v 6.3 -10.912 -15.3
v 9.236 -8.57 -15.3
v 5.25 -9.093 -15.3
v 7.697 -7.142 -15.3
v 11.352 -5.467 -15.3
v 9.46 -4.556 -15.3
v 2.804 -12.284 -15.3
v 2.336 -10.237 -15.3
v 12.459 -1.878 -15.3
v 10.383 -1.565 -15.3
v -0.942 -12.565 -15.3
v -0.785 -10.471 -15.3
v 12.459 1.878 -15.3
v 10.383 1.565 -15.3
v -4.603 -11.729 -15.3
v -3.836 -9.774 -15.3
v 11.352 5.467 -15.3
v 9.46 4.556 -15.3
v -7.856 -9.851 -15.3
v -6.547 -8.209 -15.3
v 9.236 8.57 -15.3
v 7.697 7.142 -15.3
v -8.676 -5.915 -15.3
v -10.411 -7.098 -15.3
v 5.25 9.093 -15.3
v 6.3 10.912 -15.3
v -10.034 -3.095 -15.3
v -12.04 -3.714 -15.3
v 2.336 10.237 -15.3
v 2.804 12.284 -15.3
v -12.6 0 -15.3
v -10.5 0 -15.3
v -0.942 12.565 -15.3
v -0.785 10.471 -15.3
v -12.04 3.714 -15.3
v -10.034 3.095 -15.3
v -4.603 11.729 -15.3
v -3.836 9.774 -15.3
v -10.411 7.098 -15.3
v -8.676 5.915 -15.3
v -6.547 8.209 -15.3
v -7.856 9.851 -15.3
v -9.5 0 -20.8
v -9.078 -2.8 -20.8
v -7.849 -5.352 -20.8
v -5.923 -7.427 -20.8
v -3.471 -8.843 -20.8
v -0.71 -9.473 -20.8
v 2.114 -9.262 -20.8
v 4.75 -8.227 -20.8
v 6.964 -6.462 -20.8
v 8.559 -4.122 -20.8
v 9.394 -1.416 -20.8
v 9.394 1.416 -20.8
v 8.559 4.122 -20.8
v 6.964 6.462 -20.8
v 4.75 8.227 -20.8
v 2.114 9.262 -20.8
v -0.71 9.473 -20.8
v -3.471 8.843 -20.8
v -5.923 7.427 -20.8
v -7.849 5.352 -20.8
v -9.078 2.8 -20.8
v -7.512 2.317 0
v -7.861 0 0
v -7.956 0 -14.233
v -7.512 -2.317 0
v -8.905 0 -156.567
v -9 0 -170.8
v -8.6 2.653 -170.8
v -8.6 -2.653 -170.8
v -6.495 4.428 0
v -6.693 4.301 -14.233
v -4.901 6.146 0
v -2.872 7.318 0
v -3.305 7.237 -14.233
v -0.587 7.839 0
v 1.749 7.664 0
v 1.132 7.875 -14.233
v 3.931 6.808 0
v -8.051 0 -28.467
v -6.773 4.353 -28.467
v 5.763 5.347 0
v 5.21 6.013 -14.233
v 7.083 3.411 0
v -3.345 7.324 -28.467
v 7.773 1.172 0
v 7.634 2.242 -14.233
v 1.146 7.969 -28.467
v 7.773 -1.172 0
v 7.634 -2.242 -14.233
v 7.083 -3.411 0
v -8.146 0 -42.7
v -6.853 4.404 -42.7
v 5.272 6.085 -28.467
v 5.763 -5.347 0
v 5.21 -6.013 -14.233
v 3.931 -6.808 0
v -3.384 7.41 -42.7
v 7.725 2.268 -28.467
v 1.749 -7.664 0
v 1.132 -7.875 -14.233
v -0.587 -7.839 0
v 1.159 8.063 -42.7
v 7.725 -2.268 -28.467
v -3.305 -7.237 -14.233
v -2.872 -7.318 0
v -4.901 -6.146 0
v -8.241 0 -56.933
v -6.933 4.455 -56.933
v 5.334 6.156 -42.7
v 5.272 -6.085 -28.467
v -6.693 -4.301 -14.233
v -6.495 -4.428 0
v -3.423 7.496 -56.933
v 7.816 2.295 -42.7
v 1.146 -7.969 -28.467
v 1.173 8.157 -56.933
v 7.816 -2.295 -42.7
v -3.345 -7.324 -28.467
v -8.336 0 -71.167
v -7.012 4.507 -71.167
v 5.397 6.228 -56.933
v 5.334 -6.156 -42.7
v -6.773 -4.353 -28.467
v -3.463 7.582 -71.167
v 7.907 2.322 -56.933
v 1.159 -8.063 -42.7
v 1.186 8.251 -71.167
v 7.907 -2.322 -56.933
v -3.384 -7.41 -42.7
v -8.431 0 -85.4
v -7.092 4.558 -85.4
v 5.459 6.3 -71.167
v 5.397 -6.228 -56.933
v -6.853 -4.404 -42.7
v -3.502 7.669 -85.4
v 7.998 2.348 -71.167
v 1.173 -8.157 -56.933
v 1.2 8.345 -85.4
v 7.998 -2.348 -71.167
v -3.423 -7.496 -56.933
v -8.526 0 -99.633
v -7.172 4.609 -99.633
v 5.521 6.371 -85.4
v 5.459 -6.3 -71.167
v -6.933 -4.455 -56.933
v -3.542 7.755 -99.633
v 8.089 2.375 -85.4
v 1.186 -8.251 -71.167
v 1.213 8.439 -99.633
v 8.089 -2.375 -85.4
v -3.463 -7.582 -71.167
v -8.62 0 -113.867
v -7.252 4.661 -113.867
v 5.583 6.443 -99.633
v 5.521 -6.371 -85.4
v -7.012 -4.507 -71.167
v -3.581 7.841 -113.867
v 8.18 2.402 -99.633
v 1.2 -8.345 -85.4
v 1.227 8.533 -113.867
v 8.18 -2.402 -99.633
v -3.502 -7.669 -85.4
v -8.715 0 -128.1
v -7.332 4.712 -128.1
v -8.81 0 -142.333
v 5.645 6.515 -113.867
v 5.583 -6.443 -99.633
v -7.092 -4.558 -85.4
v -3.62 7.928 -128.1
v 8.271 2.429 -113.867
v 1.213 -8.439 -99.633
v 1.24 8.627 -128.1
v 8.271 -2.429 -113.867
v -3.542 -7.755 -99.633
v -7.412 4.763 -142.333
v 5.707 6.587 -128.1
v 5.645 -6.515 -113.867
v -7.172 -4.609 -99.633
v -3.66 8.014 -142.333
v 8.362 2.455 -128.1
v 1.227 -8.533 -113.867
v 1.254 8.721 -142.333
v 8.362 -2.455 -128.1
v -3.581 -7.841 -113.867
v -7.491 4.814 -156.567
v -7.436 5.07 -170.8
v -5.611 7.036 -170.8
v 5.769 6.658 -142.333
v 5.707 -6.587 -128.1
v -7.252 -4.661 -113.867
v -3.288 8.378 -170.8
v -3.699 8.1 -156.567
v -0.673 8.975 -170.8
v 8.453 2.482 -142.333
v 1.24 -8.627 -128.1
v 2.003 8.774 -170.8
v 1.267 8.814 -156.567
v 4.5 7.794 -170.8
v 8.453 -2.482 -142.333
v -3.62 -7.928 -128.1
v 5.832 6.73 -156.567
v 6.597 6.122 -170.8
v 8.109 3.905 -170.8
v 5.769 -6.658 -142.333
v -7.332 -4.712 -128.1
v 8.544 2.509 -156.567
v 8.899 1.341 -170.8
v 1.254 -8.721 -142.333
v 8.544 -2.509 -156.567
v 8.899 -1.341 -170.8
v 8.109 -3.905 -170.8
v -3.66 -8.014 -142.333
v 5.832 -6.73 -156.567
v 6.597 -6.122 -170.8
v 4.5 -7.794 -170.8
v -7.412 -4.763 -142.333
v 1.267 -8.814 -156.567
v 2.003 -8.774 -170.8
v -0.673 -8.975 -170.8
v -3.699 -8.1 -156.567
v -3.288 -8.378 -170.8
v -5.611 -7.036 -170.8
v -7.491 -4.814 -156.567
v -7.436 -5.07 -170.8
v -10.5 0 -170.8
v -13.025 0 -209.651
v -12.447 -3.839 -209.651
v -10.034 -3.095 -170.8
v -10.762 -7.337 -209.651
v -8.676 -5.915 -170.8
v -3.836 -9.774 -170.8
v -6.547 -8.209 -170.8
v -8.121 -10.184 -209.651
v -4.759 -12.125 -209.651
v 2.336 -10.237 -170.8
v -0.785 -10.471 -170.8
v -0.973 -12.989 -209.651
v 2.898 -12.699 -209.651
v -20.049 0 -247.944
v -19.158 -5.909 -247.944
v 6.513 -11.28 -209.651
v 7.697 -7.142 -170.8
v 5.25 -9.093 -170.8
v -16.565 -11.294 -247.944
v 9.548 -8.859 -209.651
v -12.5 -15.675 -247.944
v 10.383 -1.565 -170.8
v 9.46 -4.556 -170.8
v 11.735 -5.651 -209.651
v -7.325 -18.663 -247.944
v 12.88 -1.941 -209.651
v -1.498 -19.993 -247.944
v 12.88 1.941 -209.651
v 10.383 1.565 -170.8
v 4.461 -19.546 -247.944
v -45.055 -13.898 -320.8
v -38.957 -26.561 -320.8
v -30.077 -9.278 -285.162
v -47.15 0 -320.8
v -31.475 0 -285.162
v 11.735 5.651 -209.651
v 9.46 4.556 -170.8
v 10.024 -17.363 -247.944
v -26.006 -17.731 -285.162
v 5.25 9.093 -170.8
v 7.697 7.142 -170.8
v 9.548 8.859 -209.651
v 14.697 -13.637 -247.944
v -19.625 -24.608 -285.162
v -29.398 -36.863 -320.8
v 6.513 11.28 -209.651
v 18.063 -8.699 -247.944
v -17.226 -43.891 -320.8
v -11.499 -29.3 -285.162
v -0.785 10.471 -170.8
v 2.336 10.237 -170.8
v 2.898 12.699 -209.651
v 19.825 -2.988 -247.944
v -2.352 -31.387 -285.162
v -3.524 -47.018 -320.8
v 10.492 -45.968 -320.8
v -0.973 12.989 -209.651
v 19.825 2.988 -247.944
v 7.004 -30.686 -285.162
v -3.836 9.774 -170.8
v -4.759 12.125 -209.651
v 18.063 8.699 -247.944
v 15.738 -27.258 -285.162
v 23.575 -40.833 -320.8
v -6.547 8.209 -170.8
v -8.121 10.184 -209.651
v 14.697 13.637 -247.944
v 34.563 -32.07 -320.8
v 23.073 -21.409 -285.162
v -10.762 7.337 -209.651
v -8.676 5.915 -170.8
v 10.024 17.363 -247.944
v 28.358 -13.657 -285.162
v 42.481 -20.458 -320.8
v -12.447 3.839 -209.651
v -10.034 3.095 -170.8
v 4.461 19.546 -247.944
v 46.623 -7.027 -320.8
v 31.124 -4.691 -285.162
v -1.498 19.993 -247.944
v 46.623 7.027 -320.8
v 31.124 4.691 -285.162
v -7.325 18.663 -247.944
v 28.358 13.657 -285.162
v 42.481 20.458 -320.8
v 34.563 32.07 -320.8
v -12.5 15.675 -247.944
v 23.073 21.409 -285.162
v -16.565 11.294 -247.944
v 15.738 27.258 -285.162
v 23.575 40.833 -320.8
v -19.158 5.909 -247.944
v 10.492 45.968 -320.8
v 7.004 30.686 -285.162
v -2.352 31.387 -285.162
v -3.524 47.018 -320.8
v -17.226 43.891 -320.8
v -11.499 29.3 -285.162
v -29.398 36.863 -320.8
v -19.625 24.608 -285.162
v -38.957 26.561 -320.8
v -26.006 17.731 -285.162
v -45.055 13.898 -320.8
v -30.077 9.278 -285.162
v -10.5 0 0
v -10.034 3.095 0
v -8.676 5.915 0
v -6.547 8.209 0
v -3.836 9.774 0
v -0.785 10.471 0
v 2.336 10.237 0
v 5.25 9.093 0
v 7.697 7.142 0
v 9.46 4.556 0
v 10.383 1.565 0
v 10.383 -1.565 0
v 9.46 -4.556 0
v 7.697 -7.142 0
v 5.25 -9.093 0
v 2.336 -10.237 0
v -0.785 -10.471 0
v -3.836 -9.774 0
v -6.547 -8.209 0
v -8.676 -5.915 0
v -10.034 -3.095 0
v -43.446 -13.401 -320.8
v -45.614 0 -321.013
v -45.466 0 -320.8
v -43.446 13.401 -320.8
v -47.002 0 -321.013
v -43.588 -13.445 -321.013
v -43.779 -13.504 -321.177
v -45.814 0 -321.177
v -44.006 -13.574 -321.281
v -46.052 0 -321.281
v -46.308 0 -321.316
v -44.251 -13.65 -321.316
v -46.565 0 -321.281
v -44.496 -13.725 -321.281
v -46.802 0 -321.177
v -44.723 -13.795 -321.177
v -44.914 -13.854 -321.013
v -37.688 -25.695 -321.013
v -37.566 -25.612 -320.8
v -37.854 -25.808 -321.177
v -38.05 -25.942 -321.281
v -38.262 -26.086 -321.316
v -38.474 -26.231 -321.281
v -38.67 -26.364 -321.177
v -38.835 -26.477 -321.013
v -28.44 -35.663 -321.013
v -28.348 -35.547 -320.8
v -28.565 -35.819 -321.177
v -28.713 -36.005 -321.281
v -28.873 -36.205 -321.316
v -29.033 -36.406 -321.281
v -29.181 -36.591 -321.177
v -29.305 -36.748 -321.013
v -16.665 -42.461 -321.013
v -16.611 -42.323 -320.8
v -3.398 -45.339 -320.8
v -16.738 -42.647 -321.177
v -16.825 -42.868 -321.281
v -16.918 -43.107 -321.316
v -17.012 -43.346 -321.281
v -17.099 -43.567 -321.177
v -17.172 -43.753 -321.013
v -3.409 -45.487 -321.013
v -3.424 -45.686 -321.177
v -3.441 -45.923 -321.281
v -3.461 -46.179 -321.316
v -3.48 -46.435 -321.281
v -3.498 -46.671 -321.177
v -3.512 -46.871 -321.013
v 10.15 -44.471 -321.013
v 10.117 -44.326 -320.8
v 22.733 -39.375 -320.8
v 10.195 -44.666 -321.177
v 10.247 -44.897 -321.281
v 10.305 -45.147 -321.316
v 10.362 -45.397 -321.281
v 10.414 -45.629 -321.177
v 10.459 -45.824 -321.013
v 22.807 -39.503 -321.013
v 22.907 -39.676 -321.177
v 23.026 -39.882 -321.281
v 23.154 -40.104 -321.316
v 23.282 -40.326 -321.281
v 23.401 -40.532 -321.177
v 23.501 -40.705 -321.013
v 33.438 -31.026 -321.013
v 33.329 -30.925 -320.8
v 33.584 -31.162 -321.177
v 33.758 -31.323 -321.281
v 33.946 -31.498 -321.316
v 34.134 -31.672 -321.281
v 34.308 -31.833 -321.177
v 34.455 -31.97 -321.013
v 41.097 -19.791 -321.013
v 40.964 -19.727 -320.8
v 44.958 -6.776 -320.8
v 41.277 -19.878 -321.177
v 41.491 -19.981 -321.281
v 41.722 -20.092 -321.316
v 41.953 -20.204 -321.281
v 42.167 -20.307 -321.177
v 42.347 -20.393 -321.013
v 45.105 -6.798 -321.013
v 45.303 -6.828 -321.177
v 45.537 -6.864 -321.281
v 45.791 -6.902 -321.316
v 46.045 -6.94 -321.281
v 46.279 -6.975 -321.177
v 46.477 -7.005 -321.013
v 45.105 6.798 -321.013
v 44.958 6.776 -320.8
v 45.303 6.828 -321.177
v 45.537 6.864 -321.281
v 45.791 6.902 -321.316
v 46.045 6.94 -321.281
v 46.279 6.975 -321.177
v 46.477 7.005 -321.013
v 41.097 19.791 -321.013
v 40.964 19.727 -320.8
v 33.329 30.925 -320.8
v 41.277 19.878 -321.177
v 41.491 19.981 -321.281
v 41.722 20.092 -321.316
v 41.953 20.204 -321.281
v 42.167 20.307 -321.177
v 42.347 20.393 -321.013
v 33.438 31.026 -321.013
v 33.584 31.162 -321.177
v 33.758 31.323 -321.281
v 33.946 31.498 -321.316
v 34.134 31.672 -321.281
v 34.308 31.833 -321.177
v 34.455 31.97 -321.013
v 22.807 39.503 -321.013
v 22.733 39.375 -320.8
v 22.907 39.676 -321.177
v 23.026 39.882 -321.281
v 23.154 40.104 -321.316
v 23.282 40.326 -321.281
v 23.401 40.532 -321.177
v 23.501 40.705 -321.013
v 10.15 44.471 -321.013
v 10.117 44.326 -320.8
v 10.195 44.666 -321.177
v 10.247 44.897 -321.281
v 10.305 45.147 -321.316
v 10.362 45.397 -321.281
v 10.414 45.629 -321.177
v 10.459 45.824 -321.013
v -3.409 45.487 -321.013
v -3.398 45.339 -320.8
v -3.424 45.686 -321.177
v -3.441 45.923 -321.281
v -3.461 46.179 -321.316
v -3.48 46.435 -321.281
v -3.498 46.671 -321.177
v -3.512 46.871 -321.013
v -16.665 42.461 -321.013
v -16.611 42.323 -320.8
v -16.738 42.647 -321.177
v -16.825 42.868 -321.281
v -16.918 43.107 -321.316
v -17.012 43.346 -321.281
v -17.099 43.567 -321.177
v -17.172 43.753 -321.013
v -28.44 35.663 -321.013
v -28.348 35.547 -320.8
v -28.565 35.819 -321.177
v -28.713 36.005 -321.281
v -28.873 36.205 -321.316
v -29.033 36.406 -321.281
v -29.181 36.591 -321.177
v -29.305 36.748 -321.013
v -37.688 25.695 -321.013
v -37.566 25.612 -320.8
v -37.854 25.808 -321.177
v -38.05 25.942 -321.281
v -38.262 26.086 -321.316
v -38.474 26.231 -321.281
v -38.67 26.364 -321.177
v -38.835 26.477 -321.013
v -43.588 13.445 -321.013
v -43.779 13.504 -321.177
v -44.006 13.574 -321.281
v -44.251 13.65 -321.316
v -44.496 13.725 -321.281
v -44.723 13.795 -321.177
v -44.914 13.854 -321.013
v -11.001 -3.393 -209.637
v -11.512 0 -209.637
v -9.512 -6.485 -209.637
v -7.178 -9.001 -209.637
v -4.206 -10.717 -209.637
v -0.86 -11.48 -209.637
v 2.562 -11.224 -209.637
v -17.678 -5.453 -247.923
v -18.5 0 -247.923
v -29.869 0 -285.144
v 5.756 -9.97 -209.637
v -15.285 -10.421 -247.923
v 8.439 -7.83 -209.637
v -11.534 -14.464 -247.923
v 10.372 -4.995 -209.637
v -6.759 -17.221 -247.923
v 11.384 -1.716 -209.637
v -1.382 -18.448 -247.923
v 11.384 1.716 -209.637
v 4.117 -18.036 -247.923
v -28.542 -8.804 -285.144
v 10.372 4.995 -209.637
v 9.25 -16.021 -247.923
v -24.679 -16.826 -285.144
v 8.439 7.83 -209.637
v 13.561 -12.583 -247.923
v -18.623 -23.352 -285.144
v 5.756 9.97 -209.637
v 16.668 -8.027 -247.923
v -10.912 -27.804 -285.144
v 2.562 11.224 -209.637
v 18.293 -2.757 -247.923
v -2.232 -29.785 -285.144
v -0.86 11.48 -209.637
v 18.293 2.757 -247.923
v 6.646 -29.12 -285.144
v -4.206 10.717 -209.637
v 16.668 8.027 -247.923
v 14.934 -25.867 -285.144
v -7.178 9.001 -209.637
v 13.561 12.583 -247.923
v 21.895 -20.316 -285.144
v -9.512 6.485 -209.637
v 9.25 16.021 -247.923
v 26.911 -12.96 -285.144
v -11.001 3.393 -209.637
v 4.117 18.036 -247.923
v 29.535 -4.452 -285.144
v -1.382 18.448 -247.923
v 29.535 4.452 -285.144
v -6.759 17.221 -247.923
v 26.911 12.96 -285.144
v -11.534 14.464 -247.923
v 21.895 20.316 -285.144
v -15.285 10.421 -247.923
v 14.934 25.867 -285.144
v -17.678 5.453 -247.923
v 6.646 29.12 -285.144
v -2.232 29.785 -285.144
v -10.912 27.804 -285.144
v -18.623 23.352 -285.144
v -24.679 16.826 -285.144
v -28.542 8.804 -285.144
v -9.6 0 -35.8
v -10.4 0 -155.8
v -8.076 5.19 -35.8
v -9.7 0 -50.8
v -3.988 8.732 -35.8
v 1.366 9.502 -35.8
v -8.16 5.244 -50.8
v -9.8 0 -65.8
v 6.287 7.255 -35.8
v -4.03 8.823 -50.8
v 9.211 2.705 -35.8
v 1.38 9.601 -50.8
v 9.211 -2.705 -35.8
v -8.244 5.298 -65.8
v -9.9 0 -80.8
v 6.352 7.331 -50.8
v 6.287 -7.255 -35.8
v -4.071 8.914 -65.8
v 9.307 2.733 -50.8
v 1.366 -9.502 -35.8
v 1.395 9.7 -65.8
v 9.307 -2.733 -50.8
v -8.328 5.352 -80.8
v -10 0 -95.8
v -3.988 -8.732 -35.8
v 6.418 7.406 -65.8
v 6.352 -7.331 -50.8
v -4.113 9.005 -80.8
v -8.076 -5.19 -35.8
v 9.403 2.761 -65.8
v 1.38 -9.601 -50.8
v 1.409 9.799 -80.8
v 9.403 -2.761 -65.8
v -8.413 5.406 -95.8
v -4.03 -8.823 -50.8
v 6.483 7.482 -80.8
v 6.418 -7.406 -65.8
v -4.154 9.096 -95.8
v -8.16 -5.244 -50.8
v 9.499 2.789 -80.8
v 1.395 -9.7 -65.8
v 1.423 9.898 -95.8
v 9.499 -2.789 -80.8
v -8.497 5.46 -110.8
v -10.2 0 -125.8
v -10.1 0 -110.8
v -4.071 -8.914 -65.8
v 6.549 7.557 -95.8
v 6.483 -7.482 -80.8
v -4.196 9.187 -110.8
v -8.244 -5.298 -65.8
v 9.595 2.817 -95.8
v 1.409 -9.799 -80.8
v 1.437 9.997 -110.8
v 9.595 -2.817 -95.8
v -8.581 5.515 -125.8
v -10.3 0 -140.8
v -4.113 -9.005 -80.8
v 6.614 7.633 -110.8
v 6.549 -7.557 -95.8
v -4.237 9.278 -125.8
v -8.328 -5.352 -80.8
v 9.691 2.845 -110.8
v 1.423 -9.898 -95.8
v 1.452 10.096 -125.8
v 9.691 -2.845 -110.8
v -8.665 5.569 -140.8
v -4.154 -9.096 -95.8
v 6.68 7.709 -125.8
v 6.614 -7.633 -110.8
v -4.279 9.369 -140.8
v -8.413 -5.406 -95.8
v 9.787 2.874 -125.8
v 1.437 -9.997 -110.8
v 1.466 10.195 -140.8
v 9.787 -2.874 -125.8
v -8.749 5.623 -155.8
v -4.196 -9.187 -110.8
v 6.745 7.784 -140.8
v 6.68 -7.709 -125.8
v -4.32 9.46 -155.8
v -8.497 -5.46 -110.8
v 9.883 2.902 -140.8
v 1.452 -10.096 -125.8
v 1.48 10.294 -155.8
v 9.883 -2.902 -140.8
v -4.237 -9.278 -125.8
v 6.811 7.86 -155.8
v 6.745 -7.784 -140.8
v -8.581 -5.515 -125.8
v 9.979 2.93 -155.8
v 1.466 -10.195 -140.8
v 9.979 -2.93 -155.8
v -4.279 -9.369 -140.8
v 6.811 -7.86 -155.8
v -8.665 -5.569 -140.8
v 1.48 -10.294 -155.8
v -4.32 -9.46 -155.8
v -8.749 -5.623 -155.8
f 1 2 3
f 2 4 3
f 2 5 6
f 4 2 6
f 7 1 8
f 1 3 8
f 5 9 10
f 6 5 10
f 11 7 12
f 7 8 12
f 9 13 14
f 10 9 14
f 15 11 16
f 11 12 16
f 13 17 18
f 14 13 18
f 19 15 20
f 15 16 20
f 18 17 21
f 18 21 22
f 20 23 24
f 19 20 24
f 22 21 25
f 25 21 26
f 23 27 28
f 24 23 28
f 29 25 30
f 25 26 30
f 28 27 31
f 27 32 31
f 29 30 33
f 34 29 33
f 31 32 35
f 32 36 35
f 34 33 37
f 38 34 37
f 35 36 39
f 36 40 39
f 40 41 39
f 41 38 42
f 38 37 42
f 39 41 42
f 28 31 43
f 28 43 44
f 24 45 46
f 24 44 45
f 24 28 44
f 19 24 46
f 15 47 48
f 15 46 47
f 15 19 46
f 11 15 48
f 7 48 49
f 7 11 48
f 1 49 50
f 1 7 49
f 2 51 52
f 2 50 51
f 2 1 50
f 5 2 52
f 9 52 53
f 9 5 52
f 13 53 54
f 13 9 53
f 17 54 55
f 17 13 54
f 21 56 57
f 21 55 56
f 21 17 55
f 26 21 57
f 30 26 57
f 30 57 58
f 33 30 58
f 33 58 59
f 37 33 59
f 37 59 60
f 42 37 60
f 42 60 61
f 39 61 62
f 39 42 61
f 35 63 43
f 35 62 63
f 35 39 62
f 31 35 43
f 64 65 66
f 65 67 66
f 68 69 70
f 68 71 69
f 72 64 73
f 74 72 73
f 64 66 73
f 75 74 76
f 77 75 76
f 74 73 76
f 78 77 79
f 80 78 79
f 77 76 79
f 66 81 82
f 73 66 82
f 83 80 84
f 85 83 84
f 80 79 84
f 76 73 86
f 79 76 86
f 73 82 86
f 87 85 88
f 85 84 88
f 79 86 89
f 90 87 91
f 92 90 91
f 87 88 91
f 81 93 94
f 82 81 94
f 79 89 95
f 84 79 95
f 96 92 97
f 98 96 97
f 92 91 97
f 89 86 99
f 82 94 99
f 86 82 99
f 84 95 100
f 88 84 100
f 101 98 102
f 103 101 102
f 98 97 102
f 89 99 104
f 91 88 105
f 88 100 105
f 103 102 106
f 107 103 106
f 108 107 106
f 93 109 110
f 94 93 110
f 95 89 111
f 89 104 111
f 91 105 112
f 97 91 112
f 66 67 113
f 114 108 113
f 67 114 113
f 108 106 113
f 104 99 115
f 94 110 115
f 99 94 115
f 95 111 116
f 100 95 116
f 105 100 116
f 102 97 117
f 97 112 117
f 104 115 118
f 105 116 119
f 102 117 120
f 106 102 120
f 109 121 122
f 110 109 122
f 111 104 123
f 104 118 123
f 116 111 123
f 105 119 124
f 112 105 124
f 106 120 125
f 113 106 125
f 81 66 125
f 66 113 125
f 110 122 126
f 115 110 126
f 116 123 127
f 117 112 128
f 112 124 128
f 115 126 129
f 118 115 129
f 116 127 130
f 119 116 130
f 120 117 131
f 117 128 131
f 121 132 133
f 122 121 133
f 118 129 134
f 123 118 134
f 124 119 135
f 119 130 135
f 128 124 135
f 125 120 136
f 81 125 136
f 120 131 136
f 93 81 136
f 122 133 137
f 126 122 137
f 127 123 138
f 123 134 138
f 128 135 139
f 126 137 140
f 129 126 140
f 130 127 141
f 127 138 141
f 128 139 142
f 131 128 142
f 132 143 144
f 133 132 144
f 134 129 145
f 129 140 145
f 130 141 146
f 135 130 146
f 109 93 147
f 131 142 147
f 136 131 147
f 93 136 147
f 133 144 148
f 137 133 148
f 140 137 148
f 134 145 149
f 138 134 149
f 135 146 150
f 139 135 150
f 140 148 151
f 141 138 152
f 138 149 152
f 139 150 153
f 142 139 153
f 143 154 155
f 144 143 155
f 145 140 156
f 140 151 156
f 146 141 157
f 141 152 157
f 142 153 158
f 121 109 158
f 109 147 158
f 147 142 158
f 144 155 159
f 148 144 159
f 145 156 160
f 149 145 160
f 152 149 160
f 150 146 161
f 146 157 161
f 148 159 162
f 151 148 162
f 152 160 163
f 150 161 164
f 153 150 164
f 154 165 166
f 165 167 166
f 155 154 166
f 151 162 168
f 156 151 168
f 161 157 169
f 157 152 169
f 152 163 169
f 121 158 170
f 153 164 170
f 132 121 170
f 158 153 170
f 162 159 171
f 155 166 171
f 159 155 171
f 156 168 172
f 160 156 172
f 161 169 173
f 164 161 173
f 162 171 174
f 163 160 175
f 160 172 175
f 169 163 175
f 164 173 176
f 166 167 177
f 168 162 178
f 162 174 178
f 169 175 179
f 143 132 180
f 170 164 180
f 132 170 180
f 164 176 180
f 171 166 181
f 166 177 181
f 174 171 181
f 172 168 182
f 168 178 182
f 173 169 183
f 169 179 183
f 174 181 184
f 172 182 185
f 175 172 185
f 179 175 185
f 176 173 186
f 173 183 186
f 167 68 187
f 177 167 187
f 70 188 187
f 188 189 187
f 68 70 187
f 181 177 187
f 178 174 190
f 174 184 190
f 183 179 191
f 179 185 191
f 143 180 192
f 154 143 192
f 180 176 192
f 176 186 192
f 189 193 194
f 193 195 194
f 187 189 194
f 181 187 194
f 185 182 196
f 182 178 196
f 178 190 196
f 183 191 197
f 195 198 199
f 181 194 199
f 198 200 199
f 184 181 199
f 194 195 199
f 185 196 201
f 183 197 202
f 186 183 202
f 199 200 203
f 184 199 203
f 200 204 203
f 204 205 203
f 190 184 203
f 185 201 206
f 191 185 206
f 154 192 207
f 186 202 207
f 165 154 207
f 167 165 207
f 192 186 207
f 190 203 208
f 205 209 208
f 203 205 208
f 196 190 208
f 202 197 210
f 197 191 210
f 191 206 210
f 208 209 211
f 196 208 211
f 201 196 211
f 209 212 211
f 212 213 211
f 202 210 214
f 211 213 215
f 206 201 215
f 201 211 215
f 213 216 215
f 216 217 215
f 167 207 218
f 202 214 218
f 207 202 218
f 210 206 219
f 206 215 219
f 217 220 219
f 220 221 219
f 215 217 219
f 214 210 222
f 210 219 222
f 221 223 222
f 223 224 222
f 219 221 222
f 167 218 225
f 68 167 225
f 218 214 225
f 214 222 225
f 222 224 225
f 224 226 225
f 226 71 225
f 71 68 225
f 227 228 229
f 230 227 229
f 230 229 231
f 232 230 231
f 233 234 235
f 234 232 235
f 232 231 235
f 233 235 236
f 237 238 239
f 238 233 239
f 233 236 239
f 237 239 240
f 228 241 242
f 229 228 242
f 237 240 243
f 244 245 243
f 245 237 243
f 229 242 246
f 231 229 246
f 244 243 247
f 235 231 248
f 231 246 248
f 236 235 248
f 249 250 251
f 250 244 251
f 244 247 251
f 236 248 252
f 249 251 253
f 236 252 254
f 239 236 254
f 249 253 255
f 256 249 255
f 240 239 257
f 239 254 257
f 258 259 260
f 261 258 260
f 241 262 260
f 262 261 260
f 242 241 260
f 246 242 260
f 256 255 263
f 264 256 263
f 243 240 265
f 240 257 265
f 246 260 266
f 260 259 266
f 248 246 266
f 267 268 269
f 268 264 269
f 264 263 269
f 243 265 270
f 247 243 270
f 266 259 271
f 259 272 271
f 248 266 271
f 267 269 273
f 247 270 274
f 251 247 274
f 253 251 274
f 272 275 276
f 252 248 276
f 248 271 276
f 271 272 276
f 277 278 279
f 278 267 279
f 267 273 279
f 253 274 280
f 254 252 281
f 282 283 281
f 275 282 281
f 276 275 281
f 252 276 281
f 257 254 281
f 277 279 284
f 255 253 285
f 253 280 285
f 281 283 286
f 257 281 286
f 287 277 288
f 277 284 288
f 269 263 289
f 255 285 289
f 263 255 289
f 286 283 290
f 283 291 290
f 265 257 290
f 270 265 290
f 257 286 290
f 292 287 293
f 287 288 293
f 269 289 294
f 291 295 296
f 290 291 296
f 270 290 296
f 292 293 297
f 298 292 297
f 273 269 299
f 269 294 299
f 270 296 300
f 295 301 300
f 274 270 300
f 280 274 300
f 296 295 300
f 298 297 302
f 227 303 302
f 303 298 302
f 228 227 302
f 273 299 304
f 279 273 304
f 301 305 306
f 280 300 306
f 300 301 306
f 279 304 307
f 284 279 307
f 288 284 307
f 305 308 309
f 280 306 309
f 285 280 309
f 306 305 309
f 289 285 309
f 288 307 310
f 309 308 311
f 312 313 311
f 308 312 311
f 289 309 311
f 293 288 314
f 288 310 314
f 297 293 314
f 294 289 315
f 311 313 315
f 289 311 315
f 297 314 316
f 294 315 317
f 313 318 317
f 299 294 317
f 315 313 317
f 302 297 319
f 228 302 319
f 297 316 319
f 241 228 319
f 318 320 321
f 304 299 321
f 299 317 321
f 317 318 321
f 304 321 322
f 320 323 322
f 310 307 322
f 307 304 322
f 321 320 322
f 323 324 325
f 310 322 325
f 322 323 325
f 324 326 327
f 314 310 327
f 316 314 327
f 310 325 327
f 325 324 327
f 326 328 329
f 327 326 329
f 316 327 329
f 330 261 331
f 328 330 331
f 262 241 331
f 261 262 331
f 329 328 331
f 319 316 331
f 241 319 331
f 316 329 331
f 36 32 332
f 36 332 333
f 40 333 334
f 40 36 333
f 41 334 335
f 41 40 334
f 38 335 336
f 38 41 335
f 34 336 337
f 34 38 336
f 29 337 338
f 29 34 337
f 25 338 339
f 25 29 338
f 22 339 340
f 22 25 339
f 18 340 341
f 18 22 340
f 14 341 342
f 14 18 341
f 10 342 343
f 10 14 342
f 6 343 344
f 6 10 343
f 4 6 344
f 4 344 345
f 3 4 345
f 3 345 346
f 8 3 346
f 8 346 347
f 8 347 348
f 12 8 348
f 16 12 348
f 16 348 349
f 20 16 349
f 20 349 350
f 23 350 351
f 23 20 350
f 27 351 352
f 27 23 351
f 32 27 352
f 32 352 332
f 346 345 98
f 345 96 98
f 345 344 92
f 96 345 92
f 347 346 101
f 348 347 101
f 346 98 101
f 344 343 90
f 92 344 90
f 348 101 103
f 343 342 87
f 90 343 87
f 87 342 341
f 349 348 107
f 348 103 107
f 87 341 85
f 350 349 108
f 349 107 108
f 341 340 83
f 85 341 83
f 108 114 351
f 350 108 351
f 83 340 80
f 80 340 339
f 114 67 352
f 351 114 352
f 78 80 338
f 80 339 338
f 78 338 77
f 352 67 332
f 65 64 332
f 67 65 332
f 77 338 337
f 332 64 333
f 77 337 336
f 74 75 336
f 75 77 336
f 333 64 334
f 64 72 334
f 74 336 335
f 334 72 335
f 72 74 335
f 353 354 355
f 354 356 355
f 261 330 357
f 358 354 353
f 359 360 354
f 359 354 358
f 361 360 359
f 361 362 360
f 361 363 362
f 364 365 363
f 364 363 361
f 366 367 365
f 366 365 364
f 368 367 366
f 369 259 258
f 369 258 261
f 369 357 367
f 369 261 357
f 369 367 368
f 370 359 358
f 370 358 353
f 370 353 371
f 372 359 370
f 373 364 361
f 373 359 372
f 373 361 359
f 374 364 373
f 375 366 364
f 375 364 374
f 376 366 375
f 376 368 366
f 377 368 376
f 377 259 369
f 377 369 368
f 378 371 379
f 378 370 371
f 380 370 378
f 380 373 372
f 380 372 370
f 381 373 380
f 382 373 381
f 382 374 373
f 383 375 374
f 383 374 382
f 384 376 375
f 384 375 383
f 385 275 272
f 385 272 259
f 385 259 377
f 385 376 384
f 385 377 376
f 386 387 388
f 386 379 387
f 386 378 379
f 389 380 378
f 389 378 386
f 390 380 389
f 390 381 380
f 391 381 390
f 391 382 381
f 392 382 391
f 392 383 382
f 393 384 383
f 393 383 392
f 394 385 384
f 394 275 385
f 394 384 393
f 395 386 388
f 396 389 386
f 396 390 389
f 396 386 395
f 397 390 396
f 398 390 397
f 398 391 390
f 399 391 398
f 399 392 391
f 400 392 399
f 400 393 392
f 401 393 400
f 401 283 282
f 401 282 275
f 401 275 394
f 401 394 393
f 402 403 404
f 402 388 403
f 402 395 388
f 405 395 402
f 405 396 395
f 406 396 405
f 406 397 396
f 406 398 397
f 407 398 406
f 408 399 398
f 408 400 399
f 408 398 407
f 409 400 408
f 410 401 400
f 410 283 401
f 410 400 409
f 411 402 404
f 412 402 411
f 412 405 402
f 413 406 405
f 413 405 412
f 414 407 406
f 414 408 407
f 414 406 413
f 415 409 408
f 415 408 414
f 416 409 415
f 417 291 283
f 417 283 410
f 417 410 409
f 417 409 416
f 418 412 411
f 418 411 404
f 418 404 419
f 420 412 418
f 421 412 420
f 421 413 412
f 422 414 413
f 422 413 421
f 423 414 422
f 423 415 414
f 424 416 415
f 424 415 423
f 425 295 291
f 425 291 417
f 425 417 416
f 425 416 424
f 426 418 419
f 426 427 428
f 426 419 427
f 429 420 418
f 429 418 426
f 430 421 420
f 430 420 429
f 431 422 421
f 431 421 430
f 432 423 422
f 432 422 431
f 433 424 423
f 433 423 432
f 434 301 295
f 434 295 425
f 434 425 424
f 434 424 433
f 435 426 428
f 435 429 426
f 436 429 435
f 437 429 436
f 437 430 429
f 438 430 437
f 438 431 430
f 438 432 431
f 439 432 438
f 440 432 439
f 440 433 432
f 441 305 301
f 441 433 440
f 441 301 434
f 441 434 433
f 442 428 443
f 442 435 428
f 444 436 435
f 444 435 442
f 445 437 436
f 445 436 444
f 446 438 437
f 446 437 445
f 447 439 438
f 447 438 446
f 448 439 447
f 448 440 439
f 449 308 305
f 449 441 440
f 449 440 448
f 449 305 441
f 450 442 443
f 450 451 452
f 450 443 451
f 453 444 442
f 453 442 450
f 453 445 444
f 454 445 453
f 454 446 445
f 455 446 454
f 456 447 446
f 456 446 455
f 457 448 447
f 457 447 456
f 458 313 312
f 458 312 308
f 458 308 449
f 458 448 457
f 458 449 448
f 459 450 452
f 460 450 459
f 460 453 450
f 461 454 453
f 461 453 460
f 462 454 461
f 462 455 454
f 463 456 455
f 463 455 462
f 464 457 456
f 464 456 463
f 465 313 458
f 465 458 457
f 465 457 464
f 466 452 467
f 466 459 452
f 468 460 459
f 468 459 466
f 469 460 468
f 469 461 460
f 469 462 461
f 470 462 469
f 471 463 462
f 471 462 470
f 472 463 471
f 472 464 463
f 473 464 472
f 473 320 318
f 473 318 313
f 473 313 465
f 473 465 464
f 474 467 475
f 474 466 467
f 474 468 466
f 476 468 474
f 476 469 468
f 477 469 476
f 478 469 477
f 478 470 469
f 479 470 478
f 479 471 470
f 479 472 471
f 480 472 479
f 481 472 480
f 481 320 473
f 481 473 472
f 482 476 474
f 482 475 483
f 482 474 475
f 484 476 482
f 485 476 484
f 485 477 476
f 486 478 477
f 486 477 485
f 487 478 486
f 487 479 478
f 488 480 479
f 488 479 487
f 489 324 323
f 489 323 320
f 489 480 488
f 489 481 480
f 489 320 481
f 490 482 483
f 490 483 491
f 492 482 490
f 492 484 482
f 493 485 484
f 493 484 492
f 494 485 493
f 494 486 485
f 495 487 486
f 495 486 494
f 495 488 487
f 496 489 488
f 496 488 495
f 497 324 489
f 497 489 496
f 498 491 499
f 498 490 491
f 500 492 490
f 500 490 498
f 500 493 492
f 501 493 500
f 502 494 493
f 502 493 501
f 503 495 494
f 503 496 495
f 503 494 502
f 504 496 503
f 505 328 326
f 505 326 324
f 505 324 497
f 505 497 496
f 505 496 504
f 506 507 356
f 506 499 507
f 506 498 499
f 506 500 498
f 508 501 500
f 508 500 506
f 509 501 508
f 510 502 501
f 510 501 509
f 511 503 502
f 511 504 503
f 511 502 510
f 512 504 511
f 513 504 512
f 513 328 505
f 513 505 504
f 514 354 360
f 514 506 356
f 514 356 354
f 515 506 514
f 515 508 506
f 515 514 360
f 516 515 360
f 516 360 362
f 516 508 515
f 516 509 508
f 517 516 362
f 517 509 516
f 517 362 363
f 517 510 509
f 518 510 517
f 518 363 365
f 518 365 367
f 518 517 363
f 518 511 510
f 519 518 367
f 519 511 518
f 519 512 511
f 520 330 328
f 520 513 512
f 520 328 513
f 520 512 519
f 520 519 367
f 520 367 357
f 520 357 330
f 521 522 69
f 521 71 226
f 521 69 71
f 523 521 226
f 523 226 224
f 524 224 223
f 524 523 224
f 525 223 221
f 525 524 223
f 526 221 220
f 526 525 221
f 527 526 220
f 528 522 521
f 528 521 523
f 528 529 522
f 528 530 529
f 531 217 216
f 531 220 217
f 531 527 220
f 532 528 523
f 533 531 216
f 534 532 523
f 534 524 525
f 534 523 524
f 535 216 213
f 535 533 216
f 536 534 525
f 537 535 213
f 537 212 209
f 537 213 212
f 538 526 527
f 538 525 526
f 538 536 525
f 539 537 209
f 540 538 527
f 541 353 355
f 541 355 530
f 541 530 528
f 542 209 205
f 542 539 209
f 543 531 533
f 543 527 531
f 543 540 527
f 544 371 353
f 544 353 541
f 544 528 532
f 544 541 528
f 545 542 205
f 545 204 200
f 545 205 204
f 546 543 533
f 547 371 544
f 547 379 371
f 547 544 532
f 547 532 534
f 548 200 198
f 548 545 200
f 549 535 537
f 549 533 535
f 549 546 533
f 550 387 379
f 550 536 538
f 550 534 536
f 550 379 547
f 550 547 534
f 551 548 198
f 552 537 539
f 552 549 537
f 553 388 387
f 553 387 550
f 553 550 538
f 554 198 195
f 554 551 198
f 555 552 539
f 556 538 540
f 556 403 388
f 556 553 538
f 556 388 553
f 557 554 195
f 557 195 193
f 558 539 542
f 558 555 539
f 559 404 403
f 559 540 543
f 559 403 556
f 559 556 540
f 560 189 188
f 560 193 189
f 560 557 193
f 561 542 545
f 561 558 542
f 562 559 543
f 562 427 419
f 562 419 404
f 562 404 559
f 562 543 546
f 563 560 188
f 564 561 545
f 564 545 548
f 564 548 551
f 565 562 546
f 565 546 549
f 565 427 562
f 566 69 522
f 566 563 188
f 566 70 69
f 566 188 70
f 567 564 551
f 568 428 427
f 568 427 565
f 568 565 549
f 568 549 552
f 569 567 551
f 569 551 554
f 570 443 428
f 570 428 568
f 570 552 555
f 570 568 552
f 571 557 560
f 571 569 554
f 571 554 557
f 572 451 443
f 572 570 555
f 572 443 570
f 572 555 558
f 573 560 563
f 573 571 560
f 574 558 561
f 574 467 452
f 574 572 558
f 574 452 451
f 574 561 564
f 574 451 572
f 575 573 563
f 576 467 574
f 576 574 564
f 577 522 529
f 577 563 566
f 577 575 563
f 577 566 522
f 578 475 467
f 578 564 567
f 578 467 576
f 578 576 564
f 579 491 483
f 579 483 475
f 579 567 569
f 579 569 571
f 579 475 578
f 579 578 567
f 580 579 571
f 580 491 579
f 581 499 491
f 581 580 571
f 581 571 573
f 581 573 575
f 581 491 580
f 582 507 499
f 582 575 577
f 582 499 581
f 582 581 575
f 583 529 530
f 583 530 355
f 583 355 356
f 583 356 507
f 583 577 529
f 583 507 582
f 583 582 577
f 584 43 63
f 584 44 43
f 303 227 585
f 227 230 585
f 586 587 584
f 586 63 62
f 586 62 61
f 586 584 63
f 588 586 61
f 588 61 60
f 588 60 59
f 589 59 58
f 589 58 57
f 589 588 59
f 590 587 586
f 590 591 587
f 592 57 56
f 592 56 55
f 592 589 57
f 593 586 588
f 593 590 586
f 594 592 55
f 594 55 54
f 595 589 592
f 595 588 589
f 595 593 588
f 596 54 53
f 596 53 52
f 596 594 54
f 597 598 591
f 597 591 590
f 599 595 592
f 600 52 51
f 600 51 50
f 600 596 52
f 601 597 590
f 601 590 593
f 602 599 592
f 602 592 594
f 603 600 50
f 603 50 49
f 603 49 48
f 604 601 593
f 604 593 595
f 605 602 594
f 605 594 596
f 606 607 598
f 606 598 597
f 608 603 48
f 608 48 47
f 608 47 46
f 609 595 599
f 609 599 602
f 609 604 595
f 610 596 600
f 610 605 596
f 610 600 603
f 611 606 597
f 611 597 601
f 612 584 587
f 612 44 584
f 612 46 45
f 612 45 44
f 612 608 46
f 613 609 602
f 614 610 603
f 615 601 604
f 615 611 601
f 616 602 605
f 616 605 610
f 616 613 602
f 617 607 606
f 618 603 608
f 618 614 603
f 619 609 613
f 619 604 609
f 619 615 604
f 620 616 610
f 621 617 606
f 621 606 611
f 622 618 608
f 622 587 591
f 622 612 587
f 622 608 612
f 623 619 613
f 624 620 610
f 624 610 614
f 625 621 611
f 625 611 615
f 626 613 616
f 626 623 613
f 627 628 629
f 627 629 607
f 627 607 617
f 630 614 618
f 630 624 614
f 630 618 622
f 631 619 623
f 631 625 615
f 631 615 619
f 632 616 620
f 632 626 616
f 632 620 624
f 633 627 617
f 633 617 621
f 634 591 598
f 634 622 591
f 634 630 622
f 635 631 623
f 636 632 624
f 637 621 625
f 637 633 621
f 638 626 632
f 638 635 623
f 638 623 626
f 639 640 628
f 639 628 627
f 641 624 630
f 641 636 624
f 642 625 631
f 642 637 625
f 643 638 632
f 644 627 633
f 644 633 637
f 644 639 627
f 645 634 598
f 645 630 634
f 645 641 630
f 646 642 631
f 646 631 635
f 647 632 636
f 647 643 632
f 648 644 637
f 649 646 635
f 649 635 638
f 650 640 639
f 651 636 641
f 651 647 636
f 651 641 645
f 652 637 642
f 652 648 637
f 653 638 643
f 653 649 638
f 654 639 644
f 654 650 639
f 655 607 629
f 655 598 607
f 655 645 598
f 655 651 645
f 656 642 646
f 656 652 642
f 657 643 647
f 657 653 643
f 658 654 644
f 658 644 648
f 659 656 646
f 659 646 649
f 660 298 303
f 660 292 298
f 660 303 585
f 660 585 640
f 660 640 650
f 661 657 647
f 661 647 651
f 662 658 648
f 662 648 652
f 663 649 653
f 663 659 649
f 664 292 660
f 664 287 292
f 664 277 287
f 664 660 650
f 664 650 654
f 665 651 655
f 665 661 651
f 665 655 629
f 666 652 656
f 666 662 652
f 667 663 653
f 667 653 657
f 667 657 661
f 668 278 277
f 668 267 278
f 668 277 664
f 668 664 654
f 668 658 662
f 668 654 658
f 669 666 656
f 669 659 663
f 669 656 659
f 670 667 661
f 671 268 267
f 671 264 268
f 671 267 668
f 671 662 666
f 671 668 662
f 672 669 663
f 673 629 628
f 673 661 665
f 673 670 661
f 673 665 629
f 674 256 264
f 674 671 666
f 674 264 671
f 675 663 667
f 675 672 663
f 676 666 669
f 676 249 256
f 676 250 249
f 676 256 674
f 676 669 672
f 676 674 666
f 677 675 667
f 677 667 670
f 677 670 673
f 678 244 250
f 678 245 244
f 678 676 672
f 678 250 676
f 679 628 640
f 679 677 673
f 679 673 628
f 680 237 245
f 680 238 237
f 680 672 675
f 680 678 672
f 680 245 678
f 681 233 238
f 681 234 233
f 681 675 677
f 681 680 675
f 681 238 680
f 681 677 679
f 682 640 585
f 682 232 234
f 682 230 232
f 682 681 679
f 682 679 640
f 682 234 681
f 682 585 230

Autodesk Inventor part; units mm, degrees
ref_plane "YZ Plane" through (0, 0, 0) normal (1, 0, 0) x (0, 1, 0)
ref_plane "XZ Plane" through (0, 0, 0) normal (0, 1, 0) x (-1, 0, 0)
ref_plane "XY Plane" through (0, 0, 0) normal (0, 0, 1) x (1, 0, 0)
sketch "Sketch1" plane through (0, 0, 0) normal (0, 1, 0) x (-1, 0, 0)
  line L0 (0, 0) -> (0, -320.8) construction
  line L1 (0, -320.8) -> (47.15, -320.8) construction
  line L2 (0, -170.8) -> (10.5, -170.8) construction
  line L3 (0, -20.8) -> (9.5, -20.8) construction
  line L4 (0, -15.3) -> (12.6, -15.3) construction
  line L5 (0, 0) -> (10.5, 0) construction
  line L6 (10.5, 0) -> (10.5, -15.3)
  line L7 (12.6, -15.3) -> (9.5, -20.8)
  line L8 (12.6, -15.3) -> (10.5, -15.3)
  line L9 (10.5, -170.8) -> (9.5, -20.8)
  arc A0 (10.5, -170.8) -> (47.15, -320.8) centre (344.907, -168.5706) ccw
  line L10 (7.8613, 0) -> (9, -170.8)
  arc A1 (9, -170.8) -> (45.4663, -320.8) centre (344.907, -168.5706) ccw
  line L11 (10.5, 0) -> (7.8613, 0)
  arc A2 (45.4663, -320.8) -> (47.15, -320.8) centre (46.3082, -320.372) ccw
  dimension "d0" = 47.15
  dimension "d1" = 10.5
  dimension "d2" = 9.5
  dimension "d3" = 12.6
  dimension "d4" = 10.5
  dimension "d5" = 150
  dimension "d6" = 150
  dimension "d7" = 5.5
  dimension "d8" = 15.3
  dimension "d9" = 1.5
revolve "Revolution1" add sketch "Sketch1" angle 360 about axis through (0, 0, 0) along (0, 0, -1)
thread "Thread1" size "M22x3" class "6g" standard "ANSI Metric M Profile" full length
equation "\"d0\" = Flare_Diameter"
equation "\"d1\" = Transition_Diameter"
equation "\"d2\" = Tail_Diameter"
equation "\"d3\" = Mount_Flange_Diameter"
equation "\"d4\" = Mount_Diameter"
equation "\"d5\" = Flare_Length"
equation "\"d6\" = Transition_Length"
equation "\"d7\" = Mount_Flange_Length"
equation "\"d8\" = Mount_Length"
equation "\"d9\" = Bell_Thickness"
equation "\"Bell_Thickness\" = 1.5"
equation "\"Flare_Length\" = 150"
equation "\"Transition_Length\" = 150"
equation "\"Transition_Diameter\" = 10.5"
equation "\"Flare_Diameter\" = 47.15"
equation "\"Mount_Length\" = 15.3"
equation "\"Mount_Diameter\" = 10.5"
equation "\"Mount_Flange_Length\" = 5.5"
equation "\"Mount_Flange_Diameter\" = 12.6"
equation "\"Tail_Diameter\" = 9.5"
properties part number "Horn_A" material "Steel, Cast"
